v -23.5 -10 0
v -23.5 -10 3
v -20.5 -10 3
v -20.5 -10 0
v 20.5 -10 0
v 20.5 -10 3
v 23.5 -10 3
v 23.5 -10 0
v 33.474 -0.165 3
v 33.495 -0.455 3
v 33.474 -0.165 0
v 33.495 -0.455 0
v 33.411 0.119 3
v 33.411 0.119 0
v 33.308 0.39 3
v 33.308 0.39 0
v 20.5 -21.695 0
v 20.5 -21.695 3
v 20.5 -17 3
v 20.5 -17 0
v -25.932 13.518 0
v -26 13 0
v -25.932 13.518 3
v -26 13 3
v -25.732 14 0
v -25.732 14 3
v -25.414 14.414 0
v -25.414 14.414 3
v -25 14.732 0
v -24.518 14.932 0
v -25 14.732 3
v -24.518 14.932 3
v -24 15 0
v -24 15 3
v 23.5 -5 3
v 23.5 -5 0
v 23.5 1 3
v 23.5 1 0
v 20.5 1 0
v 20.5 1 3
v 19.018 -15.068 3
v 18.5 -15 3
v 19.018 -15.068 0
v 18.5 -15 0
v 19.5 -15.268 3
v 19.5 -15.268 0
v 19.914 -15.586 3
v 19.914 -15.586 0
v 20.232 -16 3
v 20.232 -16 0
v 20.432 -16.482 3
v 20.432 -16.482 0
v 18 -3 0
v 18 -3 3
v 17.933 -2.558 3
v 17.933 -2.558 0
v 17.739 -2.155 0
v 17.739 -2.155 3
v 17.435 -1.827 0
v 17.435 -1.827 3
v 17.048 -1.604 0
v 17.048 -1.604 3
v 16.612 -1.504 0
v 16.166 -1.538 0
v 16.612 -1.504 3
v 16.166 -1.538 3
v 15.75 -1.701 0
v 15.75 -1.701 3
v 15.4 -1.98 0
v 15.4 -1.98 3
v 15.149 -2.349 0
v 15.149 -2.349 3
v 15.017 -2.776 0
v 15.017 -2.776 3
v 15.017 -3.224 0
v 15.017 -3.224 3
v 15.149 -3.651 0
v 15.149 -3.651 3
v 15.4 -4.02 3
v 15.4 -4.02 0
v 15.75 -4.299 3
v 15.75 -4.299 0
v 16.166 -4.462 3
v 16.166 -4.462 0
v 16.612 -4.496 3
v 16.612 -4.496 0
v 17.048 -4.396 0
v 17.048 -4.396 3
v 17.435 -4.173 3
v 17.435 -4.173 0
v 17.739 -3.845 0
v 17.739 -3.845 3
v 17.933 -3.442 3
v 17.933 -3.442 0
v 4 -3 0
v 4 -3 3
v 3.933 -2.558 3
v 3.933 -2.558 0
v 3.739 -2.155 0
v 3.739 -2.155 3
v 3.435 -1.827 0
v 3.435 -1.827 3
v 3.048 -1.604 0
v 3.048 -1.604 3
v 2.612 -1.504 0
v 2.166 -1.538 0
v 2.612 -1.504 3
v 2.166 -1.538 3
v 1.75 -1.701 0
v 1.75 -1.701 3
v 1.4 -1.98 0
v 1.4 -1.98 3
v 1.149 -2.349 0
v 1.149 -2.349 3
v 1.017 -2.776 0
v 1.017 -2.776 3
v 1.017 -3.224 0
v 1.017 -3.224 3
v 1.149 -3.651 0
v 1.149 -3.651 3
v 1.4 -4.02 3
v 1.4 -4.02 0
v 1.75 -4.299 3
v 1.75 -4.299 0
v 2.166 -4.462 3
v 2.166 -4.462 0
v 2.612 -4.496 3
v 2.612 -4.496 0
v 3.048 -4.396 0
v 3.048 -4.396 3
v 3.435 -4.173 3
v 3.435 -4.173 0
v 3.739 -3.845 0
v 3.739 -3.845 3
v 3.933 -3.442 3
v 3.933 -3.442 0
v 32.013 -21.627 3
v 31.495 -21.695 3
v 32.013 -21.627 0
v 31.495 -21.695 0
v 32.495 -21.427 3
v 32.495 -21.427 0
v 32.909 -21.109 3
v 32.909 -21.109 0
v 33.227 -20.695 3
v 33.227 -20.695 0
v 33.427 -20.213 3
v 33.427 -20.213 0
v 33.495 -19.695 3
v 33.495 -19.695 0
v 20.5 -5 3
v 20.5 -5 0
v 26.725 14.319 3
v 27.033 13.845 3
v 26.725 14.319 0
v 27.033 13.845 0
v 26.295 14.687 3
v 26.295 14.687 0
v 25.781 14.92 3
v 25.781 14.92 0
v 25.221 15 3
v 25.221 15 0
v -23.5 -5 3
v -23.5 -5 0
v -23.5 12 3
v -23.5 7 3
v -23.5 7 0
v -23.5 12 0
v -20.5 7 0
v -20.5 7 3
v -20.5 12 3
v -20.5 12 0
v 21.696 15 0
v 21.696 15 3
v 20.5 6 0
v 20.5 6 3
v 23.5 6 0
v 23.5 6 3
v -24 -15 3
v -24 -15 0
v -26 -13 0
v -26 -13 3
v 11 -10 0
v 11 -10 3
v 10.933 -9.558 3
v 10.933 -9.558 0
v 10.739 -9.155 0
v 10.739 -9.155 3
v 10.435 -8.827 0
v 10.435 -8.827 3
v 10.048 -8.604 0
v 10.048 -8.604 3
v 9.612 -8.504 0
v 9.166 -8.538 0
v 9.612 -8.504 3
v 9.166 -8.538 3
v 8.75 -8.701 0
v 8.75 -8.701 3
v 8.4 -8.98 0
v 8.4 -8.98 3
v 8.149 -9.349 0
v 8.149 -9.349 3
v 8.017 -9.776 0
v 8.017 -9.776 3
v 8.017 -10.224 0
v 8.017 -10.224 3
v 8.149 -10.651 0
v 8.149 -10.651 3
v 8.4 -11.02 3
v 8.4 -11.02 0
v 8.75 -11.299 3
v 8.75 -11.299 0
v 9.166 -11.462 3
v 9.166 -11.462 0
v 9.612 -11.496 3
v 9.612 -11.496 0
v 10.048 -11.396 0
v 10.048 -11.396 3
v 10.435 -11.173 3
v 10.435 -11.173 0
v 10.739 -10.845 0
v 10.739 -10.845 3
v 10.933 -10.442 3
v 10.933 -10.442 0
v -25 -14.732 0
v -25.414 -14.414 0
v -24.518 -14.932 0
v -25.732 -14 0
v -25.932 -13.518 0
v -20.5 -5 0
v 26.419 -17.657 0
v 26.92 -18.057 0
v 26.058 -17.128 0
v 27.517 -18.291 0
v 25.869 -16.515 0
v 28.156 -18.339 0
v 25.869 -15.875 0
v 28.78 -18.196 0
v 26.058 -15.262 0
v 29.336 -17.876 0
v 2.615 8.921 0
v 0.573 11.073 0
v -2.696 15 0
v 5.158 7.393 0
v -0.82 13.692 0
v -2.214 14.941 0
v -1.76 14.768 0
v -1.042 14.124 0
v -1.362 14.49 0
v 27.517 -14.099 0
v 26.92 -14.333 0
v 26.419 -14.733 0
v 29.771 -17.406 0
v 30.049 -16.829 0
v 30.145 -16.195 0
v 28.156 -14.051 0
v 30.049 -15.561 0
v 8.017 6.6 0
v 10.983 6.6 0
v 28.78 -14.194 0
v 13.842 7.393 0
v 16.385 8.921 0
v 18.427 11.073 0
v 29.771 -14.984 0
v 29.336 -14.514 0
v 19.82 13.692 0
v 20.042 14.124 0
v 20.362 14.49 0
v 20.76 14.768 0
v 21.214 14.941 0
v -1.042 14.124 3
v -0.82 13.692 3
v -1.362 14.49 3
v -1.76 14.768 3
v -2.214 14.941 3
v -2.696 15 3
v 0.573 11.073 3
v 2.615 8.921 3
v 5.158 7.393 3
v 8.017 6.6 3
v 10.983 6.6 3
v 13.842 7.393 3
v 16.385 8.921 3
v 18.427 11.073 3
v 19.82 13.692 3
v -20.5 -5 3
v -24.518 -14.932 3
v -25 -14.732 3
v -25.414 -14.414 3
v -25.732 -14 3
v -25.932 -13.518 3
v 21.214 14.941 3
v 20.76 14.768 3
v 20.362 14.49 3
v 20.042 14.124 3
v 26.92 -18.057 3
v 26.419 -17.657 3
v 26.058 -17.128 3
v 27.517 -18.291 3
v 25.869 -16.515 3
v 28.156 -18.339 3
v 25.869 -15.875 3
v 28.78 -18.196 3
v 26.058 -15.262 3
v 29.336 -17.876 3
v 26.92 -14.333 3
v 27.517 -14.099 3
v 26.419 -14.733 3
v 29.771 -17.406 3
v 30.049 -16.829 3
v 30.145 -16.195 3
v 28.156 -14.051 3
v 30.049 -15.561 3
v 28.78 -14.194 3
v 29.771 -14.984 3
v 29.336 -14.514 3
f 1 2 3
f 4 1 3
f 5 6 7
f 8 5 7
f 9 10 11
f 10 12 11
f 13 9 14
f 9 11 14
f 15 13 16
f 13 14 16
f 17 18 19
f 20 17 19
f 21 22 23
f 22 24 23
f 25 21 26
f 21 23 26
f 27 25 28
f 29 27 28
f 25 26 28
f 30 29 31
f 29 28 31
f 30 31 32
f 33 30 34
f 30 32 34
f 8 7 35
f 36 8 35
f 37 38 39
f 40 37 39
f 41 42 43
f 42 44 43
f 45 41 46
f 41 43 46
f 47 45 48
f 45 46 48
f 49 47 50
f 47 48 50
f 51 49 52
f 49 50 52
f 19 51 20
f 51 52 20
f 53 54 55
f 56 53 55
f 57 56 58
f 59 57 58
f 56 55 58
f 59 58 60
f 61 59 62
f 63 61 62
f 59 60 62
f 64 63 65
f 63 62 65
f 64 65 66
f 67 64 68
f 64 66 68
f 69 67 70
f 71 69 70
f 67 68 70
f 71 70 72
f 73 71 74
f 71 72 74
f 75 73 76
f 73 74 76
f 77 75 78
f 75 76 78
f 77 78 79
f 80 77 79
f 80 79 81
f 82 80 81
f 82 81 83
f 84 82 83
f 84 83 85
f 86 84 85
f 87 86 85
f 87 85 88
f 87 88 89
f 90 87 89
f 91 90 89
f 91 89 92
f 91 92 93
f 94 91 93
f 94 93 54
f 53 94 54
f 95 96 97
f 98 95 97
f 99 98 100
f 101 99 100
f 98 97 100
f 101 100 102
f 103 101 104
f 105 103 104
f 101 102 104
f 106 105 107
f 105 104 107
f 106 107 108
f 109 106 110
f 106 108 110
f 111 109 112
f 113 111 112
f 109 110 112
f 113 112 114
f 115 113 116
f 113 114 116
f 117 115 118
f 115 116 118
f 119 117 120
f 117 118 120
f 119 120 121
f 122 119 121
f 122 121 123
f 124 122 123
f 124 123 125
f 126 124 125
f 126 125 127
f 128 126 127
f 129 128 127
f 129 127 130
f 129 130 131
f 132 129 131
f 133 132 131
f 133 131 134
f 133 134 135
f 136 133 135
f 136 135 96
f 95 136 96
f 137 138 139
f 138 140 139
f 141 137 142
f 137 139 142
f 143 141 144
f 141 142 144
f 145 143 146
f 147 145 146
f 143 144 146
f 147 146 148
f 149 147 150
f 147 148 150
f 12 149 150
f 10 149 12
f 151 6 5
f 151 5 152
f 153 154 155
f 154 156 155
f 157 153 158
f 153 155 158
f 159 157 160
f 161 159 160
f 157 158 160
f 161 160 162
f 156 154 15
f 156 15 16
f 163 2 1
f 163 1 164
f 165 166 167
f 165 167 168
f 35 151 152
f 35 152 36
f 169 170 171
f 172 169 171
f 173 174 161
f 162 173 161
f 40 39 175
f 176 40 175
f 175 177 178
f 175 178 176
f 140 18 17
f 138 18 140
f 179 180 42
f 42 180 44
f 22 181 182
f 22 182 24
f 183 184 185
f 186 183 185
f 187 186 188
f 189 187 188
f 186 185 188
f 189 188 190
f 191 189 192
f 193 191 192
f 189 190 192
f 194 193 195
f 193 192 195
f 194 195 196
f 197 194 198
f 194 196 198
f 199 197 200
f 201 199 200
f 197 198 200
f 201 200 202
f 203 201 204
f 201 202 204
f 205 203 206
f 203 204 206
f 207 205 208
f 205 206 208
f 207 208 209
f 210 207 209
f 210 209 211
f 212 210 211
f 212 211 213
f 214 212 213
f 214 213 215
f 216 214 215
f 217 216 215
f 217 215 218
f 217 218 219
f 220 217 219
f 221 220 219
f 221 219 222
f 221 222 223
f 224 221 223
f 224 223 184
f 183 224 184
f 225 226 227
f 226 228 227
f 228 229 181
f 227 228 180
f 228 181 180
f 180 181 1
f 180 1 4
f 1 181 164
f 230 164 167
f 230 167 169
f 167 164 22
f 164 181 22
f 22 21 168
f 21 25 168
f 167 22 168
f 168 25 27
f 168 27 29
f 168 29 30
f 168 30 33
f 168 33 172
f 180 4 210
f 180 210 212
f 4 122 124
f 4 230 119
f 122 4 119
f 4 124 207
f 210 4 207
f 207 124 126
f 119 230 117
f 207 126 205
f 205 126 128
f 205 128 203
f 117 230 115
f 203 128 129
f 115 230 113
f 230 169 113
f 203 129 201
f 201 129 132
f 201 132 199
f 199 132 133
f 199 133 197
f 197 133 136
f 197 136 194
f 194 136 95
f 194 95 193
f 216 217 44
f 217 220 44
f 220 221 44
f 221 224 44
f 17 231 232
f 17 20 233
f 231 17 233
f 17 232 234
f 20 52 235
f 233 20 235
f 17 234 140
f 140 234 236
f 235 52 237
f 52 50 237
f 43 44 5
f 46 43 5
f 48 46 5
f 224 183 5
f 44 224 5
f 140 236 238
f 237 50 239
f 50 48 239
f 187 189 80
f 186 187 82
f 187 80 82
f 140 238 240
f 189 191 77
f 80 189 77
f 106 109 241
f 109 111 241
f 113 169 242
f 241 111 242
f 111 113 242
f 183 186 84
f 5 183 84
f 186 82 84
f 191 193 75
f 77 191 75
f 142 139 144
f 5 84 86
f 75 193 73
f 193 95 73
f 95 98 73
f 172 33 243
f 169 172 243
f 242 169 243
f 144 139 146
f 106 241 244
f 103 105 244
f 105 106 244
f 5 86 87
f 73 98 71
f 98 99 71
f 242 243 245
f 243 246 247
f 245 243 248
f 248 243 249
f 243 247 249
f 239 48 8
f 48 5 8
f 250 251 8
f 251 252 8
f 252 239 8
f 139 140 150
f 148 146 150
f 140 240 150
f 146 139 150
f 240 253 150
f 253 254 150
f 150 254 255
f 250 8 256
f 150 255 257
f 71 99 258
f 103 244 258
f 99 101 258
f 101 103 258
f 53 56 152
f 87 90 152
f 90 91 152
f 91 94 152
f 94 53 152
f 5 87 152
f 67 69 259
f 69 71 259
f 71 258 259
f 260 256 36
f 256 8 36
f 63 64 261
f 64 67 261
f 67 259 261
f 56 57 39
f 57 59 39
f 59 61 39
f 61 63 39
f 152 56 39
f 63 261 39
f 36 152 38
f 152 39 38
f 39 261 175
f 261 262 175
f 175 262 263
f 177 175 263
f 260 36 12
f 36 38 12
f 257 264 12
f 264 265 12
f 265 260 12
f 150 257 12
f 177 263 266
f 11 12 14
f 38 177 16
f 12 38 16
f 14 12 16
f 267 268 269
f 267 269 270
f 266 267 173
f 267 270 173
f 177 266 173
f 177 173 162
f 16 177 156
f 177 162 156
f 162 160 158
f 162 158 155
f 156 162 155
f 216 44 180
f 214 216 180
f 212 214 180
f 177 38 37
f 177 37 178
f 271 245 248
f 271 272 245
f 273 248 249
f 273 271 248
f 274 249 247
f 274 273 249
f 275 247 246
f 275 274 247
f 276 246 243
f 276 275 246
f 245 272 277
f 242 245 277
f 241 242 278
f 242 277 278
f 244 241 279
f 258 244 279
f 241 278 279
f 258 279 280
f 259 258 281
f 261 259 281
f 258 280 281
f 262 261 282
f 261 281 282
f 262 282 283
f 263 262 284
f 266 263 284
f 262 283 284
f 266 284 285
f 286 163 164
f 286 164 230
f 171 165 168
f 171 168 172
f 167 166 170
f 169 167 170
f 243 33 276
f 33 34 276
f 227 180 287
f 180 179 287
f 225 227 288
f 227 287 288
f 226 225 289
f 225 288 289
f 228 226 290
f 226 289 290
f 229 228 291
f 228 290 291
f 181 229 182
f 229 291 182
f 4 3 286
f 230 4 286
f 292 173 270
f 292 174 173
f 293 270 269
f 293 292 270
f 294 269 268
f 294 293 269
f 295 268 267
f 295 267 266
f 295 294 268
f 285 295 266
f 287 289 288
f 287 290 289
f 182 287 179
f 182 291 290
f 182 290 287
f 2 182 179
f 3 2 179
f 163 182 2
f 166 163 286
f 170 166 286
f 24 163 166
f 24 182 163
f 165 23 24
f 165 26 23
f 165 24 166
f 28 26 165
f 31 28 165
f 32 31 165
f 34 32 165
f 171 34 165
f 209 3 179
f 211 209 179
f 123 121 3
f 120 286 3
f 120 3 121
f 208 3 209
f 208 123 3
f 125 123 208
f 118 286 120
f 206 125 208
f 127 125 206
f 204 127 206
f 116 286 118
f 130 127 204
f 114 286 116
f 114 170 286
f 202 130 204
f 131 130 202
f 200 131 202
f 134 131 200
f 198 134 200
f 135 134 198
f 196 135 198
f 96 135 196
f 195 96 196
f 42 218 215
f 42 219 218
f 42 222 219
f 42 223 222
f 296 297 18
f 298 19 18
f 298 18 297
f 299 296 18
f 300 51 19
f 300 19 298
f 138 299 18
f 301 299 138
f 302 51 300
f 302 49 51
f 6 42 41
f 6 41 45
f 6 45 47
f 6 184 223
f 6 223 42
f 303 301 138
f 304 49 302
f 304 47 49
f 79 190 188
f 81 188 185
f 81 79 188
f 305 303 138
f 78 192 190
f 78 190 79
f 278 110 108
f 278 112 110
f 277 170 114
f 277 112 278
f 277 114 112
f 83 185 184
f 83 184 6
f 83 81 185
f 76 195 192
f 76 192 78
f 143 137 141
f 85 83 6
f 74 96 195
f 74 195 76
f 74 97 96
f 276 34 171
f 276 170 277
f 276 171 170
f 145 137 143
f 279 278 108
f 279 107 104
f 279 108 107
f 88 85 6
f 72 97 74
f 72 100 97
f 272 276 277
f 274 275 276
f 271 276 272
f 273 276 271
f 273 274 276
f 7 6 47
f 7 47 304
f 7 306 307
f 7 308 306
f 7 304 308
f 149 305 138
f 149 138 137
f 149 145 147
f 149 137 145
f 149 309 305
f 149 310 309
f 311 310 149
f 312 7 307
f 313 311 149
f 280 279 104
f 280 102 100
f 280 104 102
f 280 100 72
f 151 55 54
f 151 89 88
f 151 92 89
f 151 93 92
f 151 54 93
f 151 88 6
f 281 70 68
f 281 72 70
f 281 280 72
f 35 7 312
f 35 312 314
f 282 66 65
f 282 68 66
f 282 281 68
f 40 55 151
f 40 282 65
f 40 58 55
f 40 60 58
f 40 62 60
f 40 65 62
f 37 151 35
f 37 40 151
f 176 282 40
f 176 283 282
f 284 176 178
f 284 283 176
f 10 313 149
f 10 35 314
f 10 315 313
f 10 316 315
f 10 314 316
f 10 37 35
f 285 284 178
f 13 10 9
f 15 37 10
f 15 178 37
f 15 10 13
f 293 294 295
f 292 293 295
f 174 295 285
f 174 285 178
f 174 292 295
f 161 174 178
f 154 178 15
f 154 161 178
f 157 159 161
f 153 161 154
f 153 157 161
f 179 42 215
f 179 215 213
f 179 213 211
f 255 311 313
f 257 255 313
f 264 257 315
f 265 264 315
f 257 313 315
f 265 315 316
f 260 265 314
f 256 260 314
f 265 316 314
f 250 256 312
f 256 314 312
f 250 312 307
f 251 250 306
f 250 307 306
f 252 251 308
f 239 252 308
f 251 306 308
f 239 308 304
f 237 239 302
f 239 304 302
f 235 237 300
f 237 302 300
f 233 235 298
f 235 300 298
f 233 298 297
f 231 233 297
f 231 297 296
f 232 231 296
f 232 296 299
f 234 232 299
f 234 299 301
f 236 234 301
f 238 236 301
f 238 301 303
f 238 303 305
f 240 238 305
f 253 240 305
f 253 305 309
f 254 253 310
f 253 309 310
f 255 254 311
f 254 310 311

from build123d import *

# Parameters (mm, degrees)
SKETCH_1_W          = 52
SKETCH_1_H          = 30
EXTRUDE_1_DEPTH     = 3
SKETCH_2_W          = 3
SKETCH_2_H          = 5
CUT_EXTRUDE_1_DEPTH = 4
SKETCH_6_W          = 4.623864405
SKETCH_6_H          = 6.377744006
EXTRUDE_2_DEPTH     = 3
SKETCH_7_W          = 3
SKETCH_7_H          = 5
CUT_EXTRUDE_4_DEPTH = 10
SKETCH_9_R          = 2
EXTRUDE_3_DEPTH     = 3
SKETCH_10_R         = 2.25
CUT_EXTRUDE_5_DEPTH = 10
SKETCH_11_R         = 1.5
CUT_EXTRUDE_6_DEPTH = 10
SKETCH_12_R         = 11
CUT_EXTRUDE_7_DEPTH = 10
FILLET_1_R          = 2
SKETCH_13_W         = 2
SKETCH_13_H         = 36.695
EXTRUDE_4_DEPTH     = 3
FILLET_2_R          = 2
CHAMFER_1_SIZE      = 7
CHAMFER_1_SIZE2     = 15.011548444
FILLET_3_R          = 2
SKETCH_15_R         = 2.25
SKETCH_15_R_2       = 2.15
EXTRUDE_6_DEPTH     = 3
FILLET_4_R          = 2


with BuildPart() as part:
    # 草图1 → 凸台-拉伸1 (new body)
    with BuildSketch(Plane.XY):
        Rectangle(SKETCH_1_W, SKETCH_1_H)
    extrude(amount=EXTRUDE_1_DEPTH)

    # 草图2 → 切除-拉伸1 (cut)
    with BuildSketch(Plane.XY.offset(3)):
        with Locations((22, -7.5)):
            Rectangle(SKETCH_2_W, SKETCH_2_H)
        with Locations((22, 9.5)):
            Rectangle(SKETCH_2_W, SKETCH_2_H)
        with Locations((-22, 9.5)):
            Rectangle(SKETCH_2_W, SKETCH_2_H)
        with Locations((-22, -7.5)):
            Rectangle(SKETCH_2_W, SKETCH_2_H)
    extrude(amount=-CUT_EXTRUDE_1_DEPTH, mode=Mode.SUBTRACT)

    # 草图6 → 凸台-拉伸2 (add)
    with BuildSketch(Plane(origin=(0, 0, 0), x_dir=(-1, 0, 0), z_dir=(0, 0, -1))):
        with Locations((-21.865764725, 9.519388139)):
            Rectangle(SKETCH_6_W, SKETCH_6_H)
    extrude(amount=-EXTRUDE_2_DEPTH)

    # 草图7 → 切除-拉伸4 (cut)
    with BuildSketch(Plane(origin=(0, 0, 0), x_dir=(-1, 0, 0), z_dir=(0, 0, -1))):
        with Locations((-22, 3.5)):
            Rectangle(SKETCH_7_W, SKETCH_7_H)
    extrude(amount=-CUT_EXTRUDE_4_DEPTH, mode=Mode.SUBTRACT)

    # 草图9 → 凸台-拉伸3 (add)
    with BuildSketch(Plane.XY.offset(3)):
        Polygon((26, 15), (31.495, 15), (31.495, -21.695), (20.5, -21.695), (20.5, -15), (26, -15), align=None)
        with Locations((27.995, -16.195)):
            Circle(SKETCH_9_R, mode=Mode.SUBTRACT)
    extrude(amount=-EXTRUDE_3_DEPTH)

    # 草图10 → 切除-拉伸5 (cut)
    with BuildSketch(Plane.XY.offset(3)):
        with Locations((27.995, -16.195)):
            Circle(SKETCH_10_R)
    extrude(amount=-CUT_EXTRUDE_5_DEPTH, mode=Mode.SUBTRACT)

    # 草图11 → 切除-拉伸6 (cut)
    with BuildSketch(Plane.XY.offset(3)):
        with Locations((2.5, -3)):
            Circle(SKETCH_11_R)
        with Locations((16.5, -3)):
            Circle(SKETCH_11_R)
        with Locations((9.5, -10)):
            Circle(SKETCH_11_R)
    extrude(amount=-CUT_EXTRUDE_6_DEPTH, mode=Mode.SUBTRACT)

    # 草图12 → 切除-拉伸7 (cut)
    with BuildSketch(Plane.XY.offset(3)):
        with Locations((9.5, 17.5)):
            Circle(SKETCH_12_R)
    extrude(amount=-CUT_EXTRUDE_7_DEPTH, mode=Mode.SUBTRACT)

    # 圆角1
    fillet_1_edges = [part.edges().sort_by_distance(p)[0] for p in [
        (20.5, -15, 1.5),
        (20.212142643, 15, 1.5),
        (-1.212142643, 15, 1.5),
    ]]
    fillet(fillet_1_edges, radius=FILLET_1_R)

    # 草图13 → 凸台-拉伸4 (add)
    with BuildSketch(Plane.XY.offset(3)):
        with Locations((32.495, -3.3475)):
            Rectangle(SKETCH_13_W, SKETCH_13_H)
    extrude(amount=-EXTRUDE_4_DEPTH)

    # 圆角2
    fillet_2_edges = [part.edges().sort_by_distance(p)[0] for p in [
        (33.495, -21.695, 1.5),
    ]]
    fillet(fillet_2_edges, radius=FILLET_2_R)

    # 倒角1
    chamfer_1_edges = [part.edges().sort_by_distance(p)[0] for p in [
        (33.495, 15, 1.5),
    ]]
    chamfer_1_side = [part.faces().sort_by_distance(p)[0] for p in [
        (27.595655459, 15, 1.5),
    ]]
    chamfer(chamfer_1_edges, length=CHAMFER_1_SIZE, length2=CHAMFER_1_SIZE2, reference=chamfer_1_side[0])

    # 圆角3
    fillet_3_edges = [part.edges().sort_by_distance(p)[0] for p in [
        (33.495, -0.011548444, 1.5),
        (26.495, 15, 1.5),
    ]]
    fillet(fillet_3_edges, radius=FILLET_3_R)

    # 草图15 → 凸台-拉伸6 (add)
    with BuildSketch(Plane.XY.offset(3)):
        with Locations((27.995, -16.195)):
            Circle(SKETCH_15_R)
        with Locations((27.995, -16.195)):
            Circle(SKETCH_15_R_2, mode=Mode.SUBTRACT)
    extrude(amount=-EXTRUDE_6_DEPTH)

    # 圆角4
    fillet_4_edges = [part.edges().sort_by_distance(p)[0] for p in [
        (-26, -15, 1.5),
        (-26, 15, 1.5),
    ]]
    fillet(fillet_4_edges, radius=FILLET_4_R)


solid = part.part
